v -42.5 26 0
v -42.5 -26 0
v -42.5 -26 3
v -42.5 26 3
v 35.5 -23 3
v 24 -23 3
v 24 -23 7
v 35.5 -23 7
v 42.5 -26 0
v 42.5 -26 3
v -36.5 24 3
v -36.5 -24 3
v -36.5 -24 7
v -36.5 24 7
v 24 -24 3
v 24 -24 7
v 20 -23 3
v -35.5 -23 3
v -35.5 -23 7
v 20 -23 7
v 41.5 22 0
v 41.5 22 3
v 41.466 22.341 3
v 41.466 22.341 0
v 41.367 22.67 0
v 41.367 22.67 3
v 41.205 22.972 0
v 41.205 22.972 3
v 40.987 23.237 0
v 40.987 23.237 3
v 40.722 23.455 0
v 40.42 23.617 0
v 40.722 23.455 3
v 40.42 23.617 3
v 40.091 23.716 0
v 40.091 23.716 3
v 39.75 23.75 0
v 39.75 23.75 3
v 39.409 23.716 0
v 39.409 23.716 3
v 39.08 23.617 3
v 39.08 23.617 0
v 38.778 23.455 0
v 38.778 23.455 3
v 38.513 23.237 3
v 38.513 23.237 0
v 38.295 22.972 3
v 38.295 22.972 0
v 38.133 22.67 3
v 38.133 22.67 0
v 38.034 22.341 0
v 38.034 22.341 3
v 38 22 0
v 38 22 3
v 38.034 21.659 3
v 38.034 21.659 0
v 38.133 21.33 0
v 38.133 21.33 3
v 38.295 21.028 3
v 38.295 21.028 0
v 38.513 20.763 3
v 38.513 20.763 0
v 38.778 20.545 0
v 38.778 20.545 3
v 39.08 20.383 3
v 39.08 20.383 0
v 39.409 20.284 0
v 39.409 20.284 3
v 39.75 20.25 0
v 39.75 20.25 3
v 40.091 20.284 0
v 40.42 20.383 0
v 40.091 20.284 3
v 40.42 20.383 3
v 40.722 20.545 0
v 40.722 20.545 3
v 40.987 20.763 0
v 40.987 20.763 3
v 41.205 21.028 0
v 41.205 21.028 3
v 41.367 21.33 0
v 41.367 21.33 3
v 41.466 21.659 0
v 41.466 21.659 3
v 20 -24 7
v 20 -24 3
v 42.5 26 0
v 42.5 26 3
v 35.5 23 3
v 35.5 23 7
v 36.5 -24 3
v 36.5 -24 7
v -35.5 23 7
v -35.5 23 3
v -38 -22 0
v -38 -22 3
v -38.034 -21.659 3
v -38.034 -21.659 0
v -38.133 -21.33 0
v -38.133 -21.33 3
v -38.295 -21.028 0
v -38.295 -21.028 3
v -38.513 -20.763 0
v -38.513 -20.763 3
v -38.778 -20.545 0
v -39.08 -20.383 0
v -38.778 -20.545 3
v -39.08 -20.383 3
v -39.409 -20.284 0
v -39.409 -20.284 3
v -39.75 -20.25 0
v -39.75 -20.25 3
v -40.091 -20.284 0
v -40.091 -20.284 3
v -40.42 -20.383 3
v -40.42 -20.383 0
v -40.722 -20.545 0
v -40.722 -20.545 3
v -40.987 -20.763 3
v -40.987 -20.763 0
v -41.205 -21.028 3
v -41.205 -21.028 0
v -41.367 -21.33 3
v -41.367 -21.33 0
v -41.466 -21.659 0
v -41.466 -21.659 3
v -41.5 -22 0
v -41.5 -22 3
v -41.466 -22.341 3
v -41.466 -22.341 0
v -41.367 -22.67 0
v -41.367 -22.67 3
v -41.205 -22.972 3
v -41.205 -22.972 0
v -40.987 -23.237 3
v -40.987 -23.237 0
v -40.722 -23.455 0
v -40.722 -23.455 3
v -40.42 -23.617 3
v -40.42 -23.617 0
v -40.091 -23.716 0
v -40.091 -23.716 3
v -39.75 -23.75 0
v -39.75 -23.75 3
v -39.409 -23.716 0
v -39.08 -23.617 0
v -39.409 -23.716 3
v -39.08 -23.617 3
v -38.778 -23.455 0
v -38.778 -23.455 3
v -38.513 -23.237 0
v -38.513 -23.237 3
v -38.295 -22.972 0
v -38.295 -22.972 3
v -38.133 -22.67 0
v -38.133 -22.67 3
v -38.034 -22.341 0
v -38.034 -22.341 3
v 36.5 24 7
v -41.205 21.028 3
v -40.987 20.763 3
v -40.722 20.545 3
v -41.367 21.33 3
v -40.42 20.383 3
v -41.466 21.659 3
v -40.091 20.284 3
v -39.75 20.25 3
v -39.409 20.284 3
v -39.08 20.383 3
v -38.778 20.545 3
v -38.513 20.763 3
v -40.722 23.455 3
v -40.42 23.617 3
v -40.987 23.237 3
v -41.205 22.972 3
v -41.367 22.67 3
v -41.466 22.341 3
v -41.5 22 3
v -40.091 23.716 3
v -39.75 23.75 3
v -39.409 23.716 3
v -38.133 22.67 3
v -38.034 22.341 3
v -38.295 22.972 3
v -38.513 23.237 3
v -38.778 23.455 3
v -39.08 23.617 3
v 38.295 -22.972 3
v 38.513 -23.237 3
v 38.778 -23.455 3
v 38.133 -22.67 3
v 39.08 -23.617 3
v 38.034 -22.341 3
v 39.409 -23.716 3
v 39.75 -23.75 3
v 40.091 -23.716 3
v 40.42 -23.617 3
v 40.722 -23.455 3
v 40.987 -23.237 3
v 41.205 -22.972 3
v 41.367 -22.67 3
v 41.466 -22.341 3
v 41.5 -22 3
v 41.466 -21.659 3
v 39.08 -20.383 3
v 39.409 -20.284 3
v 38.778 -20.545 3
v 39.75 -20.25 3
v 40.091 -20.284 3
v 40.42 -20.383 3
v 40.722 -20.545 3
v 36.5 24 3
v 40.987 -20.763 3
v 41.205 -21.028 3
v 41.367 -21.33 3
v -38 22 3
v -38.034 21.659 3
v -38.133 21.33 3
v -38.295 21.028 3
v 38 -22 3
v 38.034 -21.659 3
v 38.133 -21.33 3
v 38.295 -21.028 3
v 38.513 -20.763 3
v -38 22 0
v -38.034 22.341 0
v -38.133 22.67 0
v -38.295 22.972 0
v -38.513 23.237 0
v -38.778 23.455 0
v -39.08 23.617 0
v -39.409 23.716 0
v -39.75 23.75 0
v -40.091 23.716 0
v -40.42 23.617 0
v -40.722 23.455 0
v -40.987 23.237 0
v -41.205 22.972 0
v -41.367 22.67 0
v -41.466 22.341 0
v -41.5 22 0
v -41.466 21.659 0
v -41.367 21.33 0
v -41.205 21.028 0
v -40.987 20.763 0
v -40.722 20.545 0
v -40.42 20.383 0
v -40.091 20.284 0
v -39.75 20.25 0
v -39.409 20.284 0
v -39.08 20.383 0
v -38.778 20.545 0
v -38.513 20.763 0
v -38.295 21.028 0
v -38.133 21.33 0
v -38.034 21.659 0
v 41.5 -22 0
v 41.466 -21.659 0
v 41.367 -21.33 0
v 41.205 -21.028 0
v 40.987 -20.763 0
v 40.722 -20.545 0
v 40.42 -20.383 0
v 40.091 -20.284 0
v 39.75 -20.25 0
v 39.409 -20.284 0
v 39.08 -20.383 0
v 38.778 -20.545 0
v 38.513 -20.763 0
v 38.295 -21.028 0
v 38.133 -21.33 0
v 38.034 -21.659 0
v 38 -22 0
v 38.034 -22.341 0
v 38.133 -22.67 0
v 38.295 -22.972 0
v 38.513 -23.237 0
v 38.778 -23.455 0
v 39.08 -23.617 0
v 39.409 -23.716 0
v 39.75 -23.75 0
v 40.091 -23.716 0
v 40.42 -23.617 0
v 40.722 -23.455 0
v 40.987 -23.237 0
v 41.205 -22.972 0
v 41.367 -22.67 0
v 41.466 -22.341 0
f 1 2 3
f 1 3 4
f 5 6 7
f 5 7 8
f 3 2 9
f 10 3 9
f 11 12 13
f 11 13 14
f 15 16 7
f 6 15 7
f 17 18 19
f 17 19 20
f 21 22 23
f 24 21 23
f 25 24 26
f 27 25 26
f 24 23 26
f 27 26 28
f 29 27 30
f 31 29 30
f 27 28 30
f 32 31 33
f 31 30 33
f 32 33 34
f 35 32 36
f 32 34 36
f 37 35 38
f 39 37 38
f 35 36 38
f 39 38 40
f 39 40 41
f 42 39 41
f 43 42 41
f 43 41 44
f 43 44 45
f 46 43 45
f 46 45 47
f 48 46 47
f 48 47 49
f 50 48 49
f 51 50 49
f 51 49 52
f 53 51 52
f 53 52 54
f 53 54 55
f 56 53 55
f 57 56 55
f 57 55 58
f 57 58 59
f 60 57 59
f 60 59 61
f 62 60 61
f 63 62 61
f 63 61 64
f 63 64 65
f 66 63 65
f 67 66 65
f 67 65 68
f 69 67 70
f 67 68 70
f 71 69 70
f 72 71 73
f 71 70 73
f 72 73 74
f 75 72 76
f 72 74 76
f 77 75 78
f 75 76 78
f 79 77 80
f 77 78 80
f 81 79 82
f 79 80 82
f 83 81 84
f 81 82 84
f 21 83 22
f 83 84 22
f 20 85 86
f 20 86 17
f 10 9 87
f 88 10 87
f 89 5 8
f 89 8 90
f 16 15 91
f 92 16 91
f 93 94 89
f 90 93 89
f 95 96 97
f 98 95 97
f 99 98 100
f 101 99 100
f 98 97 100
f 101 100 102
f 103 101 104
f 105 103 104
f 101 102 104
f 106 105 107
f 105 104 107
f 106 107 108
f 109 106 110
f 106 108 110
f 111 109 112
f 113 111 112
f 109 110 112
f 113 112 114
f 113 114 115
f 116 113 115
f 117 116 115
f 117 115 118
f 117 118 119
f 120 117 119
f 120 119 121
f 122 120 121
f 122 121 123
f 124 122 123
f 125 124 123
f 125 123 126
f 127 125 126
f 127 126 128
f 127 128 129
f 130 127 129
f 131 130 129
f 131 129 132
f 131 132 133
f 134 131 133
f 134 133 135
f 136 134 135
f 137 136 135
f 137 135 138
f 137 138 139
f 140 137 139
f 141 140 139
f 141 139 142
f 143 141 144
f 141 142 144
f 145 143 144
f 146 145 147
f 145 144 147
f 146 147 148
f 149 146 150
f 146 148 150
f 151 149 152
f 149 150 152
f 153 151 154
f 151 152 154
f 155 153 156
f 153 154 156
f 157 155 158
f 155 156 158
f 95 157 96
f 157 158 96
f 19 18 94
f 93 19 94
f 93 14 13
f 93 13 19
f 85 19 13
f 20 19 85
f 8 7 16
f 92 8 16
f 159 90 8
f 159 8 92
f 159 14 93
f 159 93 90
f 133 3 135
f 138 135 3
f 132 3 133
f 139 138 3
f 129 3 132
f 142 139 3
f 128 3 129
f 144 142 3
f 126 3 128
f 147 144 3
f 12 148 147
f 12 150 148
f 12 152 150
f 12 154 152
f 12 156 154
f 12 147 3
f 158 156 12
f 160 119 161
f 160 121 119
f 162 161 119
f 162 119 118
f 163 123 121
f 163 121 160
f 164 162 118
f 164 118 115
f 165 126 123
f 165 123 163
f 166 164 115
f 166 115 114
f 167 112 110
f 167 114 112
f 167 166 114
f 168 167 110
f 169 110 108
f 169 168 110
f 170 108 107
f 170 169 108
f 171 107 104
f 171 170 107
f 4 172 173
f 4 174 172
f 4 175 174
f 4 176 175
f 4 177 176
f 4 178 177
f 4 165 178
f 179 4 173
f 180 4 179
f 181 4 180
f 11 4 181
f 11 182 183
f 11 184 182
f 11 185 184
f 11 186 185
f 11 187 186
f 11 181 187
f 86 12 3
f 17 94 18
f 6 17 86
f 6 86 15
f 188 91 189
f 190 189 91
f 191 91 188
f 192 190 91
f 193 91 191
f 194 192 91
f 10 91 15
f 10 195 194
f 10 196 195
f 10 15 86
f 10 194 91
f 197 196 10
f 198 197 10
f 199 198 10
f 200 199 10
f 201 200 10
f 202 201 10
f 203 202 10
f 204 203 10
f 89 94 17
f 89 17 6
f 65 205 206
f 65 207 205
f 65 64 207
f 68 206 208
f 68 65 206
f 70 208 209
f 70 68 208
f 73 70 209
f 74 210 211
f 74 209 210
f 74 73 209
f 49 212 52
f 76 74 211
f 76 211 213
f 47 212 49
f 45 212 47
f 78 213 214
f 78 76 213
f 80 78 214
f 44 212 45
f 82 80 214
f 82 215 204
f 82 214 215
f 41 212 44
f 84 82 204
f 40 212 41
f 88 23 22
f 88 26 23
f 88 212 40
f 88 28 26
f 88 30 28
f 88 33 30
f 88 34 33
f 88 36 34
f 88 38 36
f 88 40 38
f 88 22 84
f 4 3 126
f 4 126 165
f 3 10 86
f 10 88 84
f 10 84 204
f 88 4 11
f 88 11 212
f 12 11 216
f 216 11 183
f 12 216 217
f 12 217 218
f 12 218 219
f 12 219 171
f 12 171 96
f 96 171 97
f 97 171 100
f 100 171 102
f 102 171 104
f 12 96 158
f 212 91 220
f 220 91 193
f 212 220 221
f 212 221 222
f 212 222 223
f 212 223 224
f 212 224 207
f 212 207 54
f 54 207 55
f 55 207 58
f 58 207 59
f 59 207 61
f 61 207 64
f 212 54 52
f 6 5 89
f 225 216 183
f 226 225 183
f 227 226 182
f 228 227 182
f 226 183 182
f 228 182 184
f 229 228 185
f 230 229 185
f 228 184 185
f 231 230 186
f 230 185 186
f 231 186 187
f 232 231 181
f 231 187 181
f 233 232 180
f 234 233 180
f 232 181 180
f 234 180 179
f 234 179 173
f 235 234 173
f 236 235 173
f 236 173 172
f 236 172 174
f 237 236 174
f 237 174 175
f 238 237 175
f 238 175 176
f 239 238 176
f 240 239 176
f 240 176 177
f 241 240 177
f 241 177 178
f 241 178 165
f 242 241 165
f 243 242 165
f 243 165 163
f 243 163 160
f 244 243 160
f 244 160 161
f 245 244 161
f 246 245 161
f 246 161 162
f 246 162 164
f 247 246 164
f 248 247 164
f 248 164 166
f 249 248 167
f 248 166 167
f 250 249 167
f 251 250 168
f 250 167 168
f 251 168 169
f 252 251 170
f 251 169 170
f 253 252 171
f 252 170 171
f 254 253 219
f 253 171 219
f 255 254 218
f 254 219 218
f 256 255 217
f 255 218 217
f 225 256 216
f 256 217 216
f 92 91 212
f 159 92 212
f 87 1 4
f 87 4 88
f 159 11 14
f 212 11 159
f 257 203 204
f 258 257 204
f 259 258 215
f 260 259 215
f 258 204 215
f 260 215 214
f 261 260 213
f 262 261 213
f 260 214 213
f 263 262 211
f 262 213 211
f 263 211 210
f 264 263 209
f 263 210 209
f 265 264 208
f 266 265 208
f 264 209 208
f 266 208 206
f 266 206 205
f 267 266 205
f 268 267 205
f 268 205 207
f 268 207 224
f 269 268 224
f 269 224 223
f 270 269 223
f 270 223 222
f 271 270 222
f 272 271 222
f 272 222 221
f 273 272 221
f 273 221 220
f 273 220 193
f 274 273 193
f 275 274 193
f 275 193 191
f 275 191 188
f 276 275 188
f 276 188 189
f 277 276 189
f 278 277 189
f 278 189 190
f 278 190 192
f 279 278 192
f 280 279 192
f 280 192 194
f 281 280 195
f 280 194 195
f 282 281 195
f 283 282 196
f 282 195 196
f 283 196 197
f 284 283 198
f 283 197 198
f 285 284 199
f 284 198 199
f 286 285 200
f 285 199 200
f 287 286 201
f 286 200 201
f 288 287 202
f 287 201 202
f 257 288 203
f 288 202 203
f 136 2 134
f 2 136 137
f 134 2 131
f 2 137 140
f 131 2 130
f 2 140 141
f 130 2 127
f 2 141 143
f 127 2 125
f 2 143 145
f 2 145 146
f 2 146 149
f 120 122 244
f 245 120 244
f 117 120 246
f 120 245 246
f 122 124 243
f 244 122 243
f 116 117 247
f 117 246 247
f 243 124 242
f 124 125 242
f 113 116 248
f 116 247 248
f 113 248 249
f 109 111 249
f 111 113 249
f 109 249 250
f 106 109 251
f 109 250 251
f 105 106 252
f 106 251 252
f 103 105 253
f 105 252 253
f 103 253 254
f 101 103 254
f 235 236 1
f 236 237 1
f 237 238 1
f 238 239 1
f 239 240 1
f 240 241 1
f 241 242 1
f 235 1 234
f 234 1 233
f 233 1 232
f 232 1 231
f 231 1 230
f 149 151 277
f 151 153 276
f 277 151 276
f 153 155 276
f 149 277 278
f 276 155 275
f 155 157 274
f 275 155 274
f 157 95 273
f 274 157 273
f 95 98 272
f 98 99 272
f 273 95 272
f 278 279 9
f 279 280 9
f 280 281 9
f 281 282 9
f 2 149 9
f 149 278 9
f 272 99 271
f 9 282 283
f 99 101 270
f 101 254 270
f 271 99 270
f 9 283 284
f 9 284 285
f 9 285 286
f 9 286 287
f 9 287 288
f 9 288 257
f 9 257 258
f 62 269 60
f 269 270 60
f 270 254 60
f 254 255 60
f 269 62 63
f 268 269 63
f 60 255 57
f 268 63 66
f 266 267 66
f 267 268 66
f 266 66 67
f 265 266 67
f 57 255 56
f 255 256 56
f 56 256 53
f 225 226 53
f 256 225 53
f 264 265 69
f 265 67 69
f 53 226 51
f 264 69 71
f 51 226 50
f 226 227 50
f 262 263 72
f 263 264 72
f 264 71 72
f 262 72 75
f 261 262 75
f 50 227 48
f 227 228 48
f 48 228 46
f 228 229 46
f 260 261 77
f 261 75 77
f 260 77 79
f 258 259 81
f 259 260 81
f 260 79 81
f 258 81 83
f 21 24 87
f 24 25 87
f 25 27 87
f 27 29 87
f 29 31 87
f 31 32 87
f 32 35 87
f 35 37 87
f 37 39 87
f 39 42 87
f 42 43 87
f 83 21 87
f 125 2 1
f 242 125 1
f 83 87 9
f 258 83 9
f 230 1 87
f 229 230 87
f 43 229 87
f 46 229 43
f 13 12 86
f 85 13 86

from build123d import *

# Parameters (mm, degrees)
F0_W     = 85
F0_H     = 52
F1_DEPTH = 3
F2_R     = 1.75
F3_DEPTH = 25
F4_W     = 73
F4_H     = 48
F4_W_2   = 71
F4_H_2   = 46
F5_DEPTH = 4
F6_W     = 4
F6_H     = 1
F7_DEPTH = 4


with BuildPart() as f1:
    # F0 (on Top) → F1 (new body)
    with BuildSketch(Plane.XY):
        Rectangle(F0_W, F0_H)
    extrude(amount=F1_DEPTH)

    # F2 (on face) → F3 (cut)
    with BuildSketch(Plane.XY.offset(3)):
        with Locations((-39.75, 22)):
            Circle(F2_R)
        with Locations((-39.75, -22)):
            Circle(F2_R)
        with Locations((39.75, 22)):
            Circle(F2_R)
        with Locations((39.75, -22)):
            Circle(F2_R)
    extrude(amount=-F3_DEPTH, mode=Mode.SUBTRACT)

    # F4 (on face) → F5 (join)
    with BuildSketch(Plane.XY.offset(3)):
        Rectangle(F4_W, F4_H)
        Rectangle(F4_W_2, F4_H_2, mode=Mode.SUBTRACT)
    extrude(amount=F5_DEPTH)

    # F6 (on face) → F7 (cut)
    with BuildSketch(Plane.XY.offset(7)):
        with Locations((22, -23.5)):
            Rectangle(F6_W, F6_H)
    extrude(amount=-F7_DEPTH, mode=Mode.SUBTRACT)


solid = f1.part
